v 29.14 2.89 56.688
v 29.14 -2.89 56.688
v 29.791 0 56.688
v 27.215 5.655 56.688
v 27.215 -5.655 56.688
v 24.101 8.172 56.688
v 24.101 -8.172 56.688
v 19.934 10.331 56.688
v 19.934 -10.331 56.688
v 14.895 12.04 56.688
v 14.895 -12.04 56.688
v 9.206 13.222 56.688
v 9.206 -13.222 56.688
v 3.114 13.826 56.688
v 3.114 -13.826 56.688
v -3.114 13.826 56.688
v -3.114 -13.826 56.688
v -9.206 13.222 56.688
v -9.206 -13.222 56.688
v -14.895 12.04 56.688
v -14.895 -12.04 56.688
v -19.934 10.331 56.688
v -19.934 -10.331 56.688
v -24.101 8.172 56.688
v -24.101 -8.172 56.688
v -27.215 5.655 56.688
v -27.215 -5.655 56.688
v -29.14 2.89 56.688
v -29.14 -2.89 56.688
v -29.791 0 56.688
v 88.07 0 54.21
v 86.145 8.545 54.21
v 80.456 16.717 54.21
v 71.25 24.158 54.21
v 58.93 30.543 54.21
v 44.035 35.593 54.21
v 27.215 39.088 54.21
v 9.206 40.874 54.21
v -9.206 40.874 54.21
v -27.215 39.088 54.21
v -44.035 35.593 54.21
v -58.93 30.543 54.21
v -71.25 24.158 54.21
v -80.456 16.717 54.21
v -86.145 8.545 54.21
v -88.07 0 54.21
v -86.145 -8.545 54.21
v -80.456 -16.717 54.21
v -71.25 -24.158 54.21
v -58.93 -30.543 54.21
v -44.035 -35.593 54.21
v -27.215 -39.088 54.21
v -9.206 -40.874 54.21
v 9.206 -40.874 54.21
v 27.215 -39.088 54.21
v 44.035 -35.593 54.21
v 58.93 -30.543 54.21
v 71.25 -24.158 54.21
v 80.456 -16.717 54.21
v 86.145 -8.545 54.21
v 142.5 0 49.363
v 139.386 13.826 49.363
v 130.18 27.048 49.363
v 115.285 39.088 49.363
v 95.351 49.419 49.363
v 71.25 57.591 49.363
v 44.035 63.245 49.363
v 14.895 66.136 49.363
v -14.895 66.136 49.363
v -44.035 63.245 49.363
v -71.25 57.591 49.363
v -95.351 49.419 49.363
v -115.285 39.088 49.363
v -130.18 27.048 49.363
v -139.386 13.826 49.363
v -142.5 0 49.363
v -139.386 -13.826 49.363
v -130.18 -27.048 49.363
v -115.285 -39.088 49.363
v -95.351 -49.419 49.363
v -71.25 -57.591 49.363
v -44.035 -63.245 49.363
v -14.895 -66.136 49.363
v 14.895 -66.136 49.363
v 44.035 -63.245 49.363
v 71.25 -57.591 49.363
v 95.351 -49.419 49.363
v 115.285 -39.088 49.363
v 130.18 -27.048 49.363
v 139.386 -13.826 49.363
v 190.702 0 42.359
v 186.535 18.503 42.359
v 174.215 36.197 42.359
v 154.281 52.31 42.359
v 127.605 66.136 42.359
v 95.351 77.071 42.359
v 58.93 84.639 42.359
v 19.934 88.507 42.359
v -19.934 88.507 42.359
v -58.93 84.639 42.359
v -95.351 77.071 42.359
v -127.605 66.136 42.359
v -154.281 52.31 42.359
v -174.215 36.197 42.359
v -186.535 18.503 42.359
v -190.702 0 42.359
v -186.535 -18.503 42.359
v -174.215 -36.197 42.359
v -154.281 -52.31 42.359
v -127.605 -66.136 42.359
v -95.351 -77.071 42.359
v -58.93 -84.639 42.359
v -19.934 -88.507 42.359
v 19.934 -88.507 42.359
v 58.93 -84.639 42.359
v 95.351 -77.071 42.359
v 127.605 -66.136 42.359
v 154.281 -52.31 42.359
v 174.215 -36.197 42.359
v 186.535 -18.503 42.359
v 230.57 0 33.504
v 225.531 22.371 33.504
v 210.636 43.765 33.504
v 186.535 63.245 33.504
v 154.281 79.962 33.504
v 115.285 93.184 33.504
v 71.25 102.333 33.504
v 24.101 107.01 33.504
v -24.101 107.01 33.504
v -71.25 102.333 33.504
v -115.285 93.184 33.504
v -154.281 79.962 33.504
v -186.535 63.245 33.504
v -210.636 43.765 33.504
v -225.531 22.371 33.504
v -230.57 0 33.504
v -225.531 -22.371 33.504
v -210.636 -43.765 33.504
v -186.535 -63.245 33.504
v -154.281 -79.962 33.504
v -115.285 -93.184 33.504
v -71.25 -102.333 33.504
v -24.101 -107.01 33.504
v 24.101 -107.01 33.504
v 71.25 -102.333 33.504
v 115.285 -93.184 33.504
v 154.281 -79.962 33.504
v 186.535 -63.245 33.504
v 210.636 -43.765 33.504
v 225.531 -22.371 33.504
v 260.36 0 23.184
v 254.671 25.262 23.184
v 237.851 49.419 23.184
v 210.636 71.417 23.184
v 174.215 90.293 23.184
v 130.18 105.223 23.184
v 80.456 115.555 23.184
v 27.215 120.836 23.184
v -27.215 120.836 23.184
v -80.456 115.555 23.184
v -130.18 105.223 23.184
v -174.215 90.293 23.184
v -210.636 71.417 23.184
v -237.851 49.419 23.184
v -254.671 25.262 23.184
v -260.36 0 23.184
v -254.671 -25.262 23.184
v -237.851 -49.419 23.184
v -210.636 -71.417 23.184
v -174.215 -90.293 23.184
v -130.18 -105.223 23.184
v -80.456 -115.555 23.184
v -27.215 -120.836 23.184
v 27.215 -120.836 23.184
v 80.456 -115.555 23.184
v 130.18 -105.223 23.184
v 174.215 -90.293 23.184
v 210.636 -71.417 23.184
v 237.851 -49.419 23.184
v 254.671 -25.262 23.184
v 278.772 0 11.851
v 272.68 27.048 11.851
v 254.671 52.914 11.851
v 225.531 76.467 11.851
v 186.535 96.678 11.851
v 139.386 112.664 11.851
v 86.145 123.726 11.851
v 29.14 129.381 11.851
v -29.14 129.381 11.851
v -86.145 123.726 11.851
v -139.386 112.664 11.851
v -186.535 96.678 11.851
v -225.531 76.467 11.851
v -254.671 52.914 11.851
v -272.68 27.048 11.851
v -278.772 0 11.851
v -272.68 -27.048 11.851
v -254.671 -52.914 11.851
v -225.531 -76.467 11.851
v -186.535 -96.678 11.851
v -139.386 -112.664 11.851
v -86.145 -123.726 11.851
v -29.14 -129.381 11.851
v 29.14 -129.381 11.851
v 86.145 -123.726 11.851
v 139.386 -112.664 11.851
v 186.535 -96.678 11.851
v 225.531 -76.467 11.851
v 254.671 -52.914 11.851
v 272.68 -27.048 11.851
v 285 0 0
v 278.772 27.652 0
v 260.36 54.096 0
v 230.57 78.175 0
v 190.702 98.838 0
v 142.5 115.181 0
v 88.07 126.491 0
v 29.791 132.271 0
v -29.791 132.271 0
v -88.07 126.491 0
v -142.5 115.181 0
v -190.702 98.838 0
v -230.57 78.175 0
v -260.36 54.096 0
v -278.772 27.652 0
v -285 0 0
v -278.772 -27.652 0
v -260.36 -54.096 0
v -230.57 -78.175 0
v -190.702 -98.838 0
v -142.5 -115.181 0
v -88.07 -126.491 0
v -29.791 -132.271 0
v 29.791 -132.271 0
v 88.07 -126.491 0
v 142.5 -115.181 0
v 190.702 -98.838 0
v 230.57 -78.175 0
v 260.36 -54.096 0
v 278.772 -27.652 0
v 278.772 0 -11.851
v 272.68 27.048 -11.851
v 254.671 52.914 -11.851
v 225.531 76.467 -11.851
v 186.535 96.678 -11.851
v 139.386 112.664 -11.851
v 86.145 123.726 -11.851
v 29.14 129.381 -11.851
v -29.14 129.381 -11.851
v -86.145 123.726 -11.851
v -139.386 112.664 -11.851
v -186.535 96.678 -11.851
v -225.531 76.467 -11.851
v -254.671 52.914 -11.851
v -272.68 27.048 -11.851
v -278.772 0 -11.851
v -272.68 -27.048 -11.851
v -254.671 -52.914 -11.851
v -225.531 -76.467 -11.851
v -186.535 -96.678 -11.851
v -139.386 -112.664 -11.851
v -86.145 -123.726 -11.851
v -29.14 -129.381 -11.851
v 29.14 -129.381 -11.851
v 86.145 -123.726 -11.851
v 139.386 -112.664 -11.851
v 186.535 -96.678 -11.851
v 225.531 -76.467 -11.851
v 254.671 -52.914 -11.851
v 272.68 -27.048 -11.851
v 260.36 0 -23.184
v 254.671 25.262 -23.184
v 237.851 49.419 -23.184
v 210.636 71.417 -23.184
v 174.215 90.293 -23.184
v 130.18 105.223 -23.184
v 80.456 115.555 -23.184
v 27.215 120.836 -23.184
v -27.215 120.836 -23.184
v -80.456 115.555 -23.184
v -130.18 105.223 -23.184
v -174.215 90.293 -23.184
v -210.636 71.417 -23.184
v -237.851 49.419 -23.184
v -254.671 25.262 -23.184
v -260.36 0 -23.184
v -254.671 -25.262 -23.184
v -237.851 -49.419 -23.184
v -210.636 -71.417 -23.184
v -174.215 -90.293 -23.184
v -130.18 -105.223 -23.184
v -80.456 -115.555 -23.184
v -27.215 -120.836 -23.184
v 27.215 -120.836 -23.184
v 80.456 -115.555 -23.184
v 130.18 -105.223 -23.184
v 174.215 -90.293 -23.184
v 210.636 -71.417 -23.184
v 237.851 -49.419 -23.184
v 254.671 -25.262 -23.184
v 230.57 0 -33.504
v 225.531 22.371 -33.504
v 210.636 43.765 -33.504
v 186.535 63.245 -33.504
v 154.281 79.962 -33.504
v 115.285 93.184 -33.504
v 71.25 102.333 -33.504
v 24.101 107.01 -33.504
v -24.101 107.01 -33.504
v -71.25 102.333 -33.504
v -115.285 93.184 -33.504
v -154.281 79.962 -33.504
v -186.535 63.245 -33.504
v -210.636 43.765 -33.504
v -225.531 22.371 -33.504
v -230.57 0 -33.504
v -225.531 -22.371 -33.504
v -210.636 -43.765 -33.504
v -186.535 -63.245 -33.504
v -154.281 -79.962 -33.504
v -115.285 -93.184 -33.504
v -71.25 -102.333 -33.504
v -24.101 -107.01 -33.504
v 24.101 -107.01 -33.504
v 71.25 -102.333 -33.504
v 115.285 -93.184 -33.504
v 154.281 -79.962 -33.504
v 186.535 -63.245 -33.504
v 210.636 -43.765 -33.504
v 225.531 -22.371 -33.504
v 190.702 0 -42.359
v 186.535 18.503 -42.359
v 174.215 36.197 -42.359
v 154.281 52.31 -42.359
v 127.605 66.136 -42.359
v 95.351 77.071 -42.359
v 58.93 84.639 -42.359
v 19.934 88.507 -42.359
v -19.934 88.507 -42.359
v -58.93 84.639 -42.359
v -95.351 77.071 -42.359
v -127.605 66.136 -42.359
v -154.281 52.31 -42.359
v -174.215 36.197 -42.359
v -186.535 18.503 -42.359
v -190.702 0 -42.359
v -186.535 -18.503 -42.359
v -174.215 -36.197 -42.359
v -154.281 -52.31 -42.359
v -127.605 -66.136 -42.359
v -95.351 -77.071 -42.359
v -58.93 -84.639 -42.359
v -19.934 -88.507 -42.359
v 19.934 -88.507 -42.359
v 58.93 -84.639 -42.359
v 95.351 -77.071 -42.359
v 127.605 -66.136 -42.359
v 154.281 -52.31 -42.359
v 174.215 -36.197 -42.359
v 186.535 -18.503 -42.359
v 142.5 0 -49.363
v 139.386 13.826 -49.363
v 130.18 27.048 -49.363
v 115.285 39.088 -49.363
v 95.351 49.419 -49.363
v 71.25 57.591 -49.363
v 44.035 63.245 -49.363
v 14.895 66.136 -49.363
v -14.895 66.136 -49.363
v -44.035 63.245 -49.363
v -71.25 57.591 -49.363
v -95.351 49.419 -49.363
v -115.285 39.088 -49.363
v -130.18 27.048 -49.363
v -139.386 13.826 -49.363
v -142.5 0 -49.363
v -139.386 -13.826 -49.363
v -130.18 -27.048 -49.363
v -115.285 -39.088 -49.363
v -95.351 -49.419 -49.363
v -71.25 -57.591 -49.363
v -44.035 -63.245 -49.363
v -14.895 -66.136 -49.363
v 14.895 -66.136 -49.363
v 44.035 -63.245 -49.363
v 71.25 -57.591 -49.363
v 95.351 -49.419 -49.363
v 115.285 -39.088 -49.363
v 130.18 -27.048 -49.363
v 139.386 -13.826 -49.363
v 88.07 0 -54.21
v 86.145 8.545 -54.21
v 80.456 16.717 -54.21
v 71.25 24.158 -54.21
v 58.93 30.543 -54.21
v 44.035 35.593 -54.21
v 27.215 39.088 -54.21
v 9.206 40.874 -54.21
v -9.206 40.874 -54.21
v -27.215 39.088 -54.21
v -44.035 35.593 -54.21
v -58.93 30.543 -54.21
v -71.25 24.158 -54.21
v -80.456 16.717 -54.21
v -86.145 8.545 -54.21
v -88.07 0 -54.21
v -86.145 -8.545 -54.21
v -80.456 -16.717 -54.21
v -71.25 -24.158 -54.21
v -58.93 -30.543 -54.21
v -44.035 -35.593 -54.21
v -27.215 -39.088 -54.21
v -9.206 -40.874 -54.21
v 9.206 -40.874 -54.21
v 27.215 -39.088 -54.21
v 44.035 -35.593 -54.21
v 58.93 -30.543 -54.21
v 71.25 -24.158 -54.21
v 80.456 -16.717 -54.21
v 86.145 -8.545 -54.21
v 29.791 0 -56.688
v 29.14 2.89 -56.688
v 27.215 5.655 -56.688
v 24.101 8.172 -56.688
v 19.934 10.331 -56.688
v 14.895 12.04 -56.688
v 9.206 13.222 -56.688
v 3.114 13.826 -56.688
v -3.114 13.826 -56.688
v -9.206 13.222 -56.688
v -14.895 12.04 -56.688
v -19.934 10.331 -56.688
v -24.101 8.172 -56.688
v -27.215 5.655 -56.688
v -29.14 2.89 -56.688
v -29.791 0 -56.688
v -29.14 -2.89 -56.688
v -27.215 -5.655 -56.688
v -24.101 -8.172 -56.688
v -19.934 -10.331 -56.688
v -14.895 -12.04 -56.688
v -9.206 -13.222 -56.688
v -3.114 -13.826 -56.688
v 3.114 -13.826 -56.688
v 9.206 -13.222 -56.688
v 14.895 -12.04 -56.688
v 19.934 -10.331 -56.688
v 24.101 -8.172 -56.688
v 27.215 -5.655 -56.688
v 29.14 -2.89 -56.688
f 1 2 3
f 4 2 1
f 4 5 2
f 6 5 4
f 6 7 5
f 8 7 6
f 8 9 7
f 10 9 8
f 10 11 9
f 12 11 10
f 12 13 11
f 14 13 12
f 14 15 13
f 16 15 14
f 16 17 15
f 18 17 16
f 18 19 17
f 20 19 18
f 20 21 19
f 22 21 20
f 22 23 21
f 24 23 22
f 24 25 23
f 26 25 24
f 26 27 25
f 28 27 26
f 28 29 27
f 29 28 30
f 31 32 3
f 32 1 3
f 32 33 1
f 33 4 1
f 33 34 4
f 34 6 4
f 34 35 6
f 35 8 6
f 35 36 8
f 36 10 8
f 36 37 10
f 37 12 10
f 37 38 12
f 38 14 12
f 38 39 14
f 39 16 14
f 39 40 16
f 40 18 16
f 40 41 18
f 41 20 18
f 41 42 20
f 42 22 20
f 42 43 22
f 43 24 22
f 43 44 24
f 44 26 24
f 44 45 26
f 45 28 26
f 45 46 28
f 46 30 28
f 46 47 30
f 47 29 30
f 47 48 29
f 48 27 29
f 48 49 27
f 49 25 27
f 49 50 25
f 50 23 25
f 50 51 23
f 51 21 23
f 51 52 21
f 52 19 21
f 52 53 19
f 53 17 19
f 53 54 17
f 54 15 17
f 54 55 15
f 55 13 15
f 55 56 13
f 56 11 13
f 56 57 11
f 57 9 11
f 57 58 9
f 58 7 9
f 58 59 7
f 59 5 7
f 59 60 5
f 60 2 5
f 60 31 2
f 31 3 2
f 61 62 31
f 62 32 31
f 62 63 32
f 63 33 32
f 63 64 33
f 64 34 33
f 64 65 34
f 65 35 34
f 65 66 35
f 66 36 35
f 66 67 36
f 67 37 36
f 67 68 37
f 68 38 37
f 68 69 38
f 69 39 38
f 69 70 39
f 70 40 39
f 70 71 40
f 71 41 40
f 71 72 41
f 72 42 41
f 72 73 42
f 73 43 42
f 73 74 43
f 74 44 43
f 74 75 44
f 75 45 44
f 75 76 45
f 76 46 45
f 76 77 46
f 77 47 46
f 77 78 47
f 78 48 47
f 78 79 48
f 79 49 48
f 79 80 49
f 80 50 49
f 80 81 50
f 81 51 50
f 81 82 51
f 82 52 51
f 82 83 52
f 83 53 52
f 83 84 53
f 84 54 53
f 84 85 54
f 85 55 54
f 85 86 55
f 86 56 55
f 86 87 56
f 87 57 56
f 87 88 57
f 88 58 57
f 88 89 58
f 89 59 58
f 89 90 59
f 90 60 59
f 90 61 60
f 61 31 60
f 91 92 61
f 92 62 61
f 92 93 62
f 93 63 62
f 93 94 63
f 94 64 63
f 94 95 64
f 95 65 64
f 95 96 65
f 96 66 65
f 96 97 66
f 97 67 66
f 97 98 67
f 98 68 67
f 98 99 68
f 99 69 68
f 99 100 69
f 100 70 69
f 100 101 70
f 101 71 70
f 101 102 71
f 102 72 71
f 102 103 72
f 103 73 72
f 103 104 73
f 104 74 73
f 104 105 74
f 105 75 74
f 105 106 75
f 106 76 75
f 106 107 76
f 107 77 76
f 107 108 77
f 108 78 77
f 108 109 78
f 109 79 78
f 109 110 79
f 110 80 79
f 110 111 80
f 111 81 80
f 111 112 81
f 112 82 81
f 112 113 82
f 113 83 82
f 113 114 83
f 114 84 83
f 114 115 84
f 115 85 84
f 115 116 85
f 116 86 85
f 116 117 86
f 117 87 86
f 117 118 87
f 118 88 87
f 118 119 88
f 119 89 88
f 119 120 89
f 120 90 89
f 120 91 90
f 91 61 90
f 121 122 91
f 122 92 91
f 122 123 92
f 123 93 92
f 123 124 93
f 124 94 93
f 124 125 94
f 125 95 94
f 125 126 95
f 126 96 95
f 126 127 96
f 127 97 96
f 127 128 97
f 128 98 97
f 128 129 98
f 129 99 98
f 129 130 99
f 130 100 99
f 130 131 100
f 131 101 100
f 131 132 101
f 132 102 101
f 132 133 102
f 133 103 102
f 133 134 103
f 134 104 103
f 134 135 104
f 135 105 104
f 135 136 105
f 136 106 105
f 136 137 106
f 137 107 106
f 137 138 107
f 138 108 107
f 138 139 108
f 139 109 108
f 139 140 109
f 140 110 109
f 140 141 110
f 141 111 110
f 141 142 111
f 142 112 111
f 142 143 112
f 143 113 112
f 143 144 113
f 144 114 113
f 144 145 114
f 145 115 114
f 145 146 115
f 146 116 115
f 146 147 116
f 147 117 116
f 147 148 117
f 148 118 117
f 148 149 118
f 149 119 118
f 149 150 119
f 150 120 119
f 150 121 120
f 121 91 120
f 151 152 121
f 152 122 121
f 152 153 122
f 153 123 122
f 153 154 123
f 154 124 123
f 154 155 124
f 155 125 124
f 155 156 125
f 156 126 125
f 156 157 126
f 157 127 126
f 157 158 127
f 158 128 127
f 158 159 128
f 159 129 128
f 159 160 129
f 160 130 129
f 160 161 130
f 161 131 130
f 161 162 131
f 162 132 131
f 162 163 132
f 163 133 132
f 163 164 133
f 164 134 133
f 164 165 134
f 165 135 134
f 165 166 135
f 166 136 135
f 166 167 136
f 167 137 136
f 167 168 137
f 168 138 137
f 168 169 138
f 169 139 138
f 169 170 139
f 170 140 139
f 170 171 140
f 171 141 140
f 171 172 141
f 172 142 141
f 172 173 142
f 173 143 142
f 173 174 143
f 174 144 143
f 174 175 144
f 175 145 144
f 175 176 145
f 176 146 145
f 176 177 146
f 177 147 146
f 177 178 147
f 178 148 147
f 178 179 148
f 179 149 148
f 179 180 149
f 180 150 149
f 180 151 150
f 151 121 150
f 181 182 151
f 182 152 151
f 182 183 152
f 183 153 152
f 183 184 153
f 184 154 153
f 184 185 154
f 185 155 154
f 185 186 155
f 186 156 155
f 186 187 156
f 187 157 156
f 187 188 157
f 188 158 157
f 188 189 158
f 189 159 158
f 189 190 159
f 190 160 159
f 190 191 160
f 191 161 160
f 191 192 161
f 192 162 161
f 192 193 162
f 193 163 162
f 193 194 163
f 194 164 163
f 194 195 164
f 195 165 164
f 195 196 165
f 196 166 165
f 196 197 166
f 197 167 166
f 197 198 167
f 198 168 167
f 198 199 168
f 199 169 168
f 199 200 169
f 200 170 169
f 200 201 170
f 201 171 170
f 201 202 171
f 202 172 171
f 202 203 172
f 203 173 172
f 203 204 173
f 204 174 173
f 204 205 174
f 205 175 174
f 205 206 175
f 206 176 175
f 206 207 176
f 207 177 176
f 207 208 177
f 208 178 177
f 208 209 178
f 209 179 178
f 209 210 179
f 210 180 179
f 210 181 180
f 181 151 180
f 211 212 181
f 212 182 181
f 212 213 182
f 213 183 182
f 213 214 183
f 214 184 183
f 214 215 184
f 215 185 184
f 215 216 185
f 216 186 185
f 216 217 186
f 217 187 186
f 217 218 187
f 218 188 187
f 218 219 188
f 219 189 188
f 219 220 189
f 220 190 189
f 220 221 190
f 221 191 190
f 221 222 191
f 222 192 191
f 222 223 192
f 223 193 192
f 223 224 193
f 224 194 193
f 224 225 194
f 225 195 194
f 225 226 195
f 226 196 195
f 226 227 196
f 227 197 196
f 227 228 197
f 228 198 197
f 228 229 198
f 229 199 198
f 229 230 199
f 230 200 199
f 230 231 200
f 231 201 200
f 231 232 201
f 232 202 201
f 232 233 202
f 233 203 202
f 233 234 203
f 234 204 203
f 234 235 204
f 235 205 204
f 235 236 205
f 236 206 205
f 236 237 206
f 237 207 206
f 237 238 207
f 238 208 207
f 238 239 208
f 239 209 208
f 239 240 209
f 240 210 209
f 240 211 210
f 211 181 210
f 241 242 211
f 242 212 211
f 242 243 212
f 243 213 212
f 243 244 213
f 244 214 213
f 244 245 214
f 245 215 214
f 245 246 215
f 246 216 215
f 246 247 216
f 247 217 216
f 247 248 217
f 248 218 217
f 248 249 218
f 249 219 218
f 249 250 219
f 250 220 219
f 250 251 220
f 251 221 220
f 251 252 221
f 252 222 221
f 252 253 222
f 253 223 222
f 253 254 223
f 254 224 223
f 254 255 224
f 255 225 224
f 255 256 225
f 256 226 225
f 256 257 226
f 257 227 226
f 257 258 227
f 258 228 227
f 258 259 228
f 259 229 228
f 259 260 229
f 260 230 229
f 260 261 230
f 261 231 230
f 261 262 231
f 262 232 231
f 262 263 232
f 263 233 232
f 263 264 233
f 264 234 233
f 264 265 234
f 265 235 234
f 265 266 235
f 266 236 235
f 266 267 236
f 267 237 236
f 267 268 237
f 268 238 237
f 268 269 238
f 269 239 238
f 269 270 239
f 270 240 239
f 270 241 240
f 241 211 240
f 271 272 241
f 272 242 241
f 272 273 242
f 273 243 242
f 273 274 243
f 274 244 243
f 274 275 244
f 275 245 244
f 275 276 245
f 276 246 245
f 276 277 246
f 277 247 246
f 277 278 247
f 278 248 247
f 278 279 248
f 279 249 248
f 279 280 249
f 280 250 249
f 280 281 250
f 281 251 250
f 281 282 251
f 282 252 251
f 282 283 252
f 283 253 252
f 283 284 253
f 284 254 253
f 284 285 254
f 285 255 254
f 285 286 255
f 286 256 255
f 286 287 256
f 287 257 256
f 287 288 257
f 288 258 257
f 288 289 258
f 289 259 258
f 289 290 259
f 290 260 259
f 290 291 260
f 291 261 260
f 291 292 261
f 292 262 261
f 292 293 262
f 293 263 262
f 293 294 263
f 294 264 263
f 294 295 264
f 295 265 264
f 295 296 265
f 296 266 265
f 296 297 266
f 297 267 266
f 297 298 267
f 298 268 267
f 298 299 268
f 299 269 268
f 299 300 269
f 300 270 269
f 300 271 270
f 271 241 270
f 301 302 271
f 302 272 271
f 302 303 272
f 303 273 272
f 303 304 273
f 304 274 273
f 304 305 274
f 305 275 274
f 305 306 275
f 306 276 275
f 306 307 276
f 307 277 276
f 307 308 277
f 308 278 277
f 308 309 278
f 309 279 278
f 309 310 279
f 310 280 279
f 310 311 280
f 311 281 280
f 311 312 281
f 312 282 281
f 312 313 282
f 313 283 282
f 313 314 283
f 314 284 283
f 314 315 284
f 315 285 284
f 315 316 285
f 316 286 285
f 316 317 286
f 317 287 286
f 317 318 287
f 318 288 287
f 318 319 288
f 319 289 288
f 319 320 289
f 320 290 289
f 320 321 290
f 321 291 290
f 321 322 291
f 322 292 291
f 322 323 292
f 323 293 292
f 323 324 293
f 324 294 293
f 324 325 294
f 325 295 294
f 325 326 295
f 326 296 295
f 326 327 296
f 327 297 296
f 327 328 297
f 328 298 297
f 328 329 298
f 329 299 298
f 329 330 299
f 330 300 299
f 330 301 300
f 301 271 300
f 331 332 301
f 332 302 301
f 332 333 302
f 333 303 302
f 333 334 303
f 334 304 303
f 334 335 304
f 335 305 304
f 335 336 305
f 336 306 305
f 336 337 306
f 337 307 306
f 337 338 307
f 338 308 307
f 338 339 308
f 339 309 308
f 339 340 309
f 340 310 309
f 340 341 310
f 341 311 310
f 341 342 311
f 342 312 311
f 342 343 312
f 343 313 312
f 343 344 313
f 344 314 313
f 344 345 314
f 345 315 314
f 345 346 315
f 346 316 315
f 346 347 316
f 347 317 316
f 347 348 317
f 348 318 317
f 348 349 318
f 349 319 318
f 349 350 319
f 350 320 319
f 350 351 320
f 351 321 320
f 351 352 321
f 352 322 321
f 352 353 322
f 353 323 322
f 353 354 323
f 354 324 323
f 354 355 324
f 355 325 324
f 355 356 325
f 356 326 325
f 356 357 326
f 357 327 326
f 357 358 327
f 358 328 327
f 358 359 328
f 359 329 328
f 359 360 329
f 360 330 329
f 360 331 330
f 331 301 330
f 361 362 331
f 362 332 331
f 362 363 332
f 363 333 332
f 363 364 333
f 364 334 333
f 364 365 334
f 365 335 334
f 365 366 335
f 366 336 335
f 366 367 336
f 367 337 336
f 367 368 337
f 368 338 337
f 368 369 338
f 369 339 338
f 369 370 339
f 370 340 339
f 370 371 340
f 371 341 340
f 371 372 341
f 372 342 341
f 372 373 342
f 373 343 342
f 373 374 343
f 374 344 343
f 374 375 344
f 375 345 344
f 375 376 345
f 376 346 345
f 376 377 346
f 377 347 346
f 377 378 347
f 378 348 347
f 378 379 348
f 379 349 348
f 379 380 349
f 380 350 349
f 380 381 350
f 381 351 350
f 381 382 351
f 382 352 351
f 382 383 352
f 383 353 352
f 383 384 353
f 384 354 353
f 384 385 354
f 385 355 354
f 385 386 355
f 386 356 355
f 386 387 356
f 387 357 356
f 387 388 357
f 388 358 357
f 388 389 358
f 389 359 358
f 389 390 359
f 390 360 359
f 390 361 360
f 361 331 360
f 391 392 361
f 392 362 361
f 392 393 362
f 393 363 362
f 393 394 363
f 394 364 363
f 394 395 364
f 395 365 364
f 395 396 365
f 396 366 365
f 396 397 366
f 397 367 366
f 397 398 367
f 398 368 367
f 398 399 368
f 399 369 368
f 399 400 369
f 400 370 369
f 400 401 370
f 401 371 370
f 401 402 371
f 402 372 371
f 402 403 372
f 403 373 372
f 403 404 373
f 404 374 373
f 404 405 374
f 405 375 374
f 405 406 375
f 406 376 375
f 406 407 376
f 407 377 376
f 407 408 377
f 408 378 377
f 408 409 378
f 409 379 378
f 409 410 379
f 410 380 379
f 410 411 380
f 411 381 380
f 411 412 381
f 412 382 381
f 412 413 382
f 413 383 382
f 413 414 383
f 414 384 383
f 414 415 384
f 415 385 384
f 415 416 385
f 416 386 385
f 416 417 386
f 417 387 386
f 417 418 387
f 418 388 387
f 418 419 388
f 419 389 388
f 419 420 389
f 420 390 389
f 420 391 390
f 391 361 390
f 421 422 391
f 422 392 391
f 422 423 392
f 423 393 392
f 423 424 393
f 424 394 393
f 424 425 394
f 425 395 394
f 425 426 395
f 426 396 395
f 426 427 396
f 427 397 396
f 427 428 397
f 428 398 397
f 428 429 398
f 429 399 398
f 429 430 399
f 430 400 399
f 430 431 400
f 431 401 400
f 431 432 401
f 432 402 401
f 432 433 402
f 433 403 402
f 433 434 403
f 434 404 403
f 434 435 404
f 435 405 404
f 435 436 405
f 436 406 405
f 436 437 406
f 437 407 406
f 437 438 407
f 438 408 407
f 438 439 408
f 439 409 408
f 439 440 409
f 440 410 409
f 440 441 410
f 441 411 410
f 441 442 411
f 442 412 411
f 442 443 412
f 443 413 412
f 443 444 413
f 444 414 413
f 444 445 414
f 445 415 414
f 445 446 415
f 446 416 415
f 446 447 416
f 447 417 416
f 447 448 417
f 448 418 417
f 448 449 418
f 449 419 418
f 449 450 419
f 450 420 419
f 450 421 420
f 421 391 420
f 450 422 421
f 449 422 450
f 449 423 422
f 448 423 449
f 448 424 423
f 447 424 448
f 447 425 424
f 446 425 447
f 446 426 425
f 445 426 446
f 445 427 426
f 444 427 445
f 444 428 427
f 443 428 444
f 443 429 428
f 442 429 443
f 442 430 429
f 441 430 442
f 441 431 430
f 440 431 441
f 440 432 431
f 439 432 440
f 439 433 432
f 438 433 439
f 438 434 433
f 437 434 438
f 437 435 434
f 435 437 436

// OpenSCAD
// Generated by SolidPython 1.0.1 on 2020-07-29 00:46:51


scale(v = [15, 7, 3]) {
	sphere(r = 19);
}
/***********************************************
*********      SolidPython code:      **********
************************************************
 
# import packages: SolidPython
from solid import *
from solid.utils import *
from itertools import chain, combinations, permutations


class Resize:

    def __init__(self, scad_file):
        self.scad_file = scad_file
        #self.scad_file = import_scad(scad_file)
        # cone/cylinder param:
        self.r1 = 0
        self.r2 = 0
        self.h = 0
        # rectangular prism param:
        self.w = 0
        self.l = 0
        # ellipse param:
        self.r = 0

    # import OpenScad code (file name corresponds to shape)


    # classify shape + parameters
    def assign(self, param1, param2, param3):
        if self.scad_file == 'cone.scad':
            self.r1 = param1
            self.r2 = param2
            self.h = param3
        elif self.scad_file == 'cylinder.scad':
            self.r1 = param1
            self.r2 = param2
            self.h = param3
        elif self.scad_file == 'rectangularPrism.scad':
            self.h = param1
            self.l = param2
            self.w = param3
        else:
            self.r = param1
            self.h = param2

    # resize parameters
    def iterate(self):
        x = range(3, 20, 2)
        i = 1
        if self.scad_file == 'cone.scad':
            tempList = list(permutations(x, 2))
            for temp in tempList:
                param1 = temp[0]
                param2 = temp[1]
                filepath = 'produced_scad_files/' + 'cone' + str(param1) + '_' + str(param2) + '_' + '.scad'
                scad_render_to_file(cylinder(h=param1, r1=param2, r2=0), filepath)

        elif self.scad_file == 'cylinder.scad':
            tempList = list(permutations(x, 3))
            for temp in tempList:
                param1 = temp[0]
                param2 = temp[1]
                filepath = 'produced_scad_files/' + 'cylinder' + str(param1) + '_' + str(param2) + '_' + '.scad'
                scad_render_to_file(cylinder(h=param1, r1=param2, r2=param2), filepath)

        elif self.scad_file == 'rectangularPrism.scad':
            tempList = list(permutations(x, 3))
            for temp in tempList:
                param1 = temp[0]
                param2 = temp[1]
                param3 = temp[2]
                filepath = 'produced_scad_files/' + 'rectangularPrism' + str(param1) + '_' + str(param2) + '_' + str(
                    param3) + '.scad'
                scad_render_to_file(cube(size=(param1, param2, param3)), filepath)

        elif self.scad_file == 'ellipse.scad':
            tempList = list(permutations(x, 4))
            for temp in tempList:
                param1 = temp[0]
                param2 = temp[1]
                param3 = temp[2]
                param4 = temp[3]
                filepath = 'produced_scad_files/' + 'ellipse' + str(param1) + '_' + str(param2) + '_' + str(param3) + '_' + str(param4) + '.scad'
                scad_render_to_file(scale([param1, param2, param3])(sphere(r=param4)), filepath)

    def render_to_scadfile(self):
        scad_render_to_file(scad, 'example.scad') 
 
************************************************/
